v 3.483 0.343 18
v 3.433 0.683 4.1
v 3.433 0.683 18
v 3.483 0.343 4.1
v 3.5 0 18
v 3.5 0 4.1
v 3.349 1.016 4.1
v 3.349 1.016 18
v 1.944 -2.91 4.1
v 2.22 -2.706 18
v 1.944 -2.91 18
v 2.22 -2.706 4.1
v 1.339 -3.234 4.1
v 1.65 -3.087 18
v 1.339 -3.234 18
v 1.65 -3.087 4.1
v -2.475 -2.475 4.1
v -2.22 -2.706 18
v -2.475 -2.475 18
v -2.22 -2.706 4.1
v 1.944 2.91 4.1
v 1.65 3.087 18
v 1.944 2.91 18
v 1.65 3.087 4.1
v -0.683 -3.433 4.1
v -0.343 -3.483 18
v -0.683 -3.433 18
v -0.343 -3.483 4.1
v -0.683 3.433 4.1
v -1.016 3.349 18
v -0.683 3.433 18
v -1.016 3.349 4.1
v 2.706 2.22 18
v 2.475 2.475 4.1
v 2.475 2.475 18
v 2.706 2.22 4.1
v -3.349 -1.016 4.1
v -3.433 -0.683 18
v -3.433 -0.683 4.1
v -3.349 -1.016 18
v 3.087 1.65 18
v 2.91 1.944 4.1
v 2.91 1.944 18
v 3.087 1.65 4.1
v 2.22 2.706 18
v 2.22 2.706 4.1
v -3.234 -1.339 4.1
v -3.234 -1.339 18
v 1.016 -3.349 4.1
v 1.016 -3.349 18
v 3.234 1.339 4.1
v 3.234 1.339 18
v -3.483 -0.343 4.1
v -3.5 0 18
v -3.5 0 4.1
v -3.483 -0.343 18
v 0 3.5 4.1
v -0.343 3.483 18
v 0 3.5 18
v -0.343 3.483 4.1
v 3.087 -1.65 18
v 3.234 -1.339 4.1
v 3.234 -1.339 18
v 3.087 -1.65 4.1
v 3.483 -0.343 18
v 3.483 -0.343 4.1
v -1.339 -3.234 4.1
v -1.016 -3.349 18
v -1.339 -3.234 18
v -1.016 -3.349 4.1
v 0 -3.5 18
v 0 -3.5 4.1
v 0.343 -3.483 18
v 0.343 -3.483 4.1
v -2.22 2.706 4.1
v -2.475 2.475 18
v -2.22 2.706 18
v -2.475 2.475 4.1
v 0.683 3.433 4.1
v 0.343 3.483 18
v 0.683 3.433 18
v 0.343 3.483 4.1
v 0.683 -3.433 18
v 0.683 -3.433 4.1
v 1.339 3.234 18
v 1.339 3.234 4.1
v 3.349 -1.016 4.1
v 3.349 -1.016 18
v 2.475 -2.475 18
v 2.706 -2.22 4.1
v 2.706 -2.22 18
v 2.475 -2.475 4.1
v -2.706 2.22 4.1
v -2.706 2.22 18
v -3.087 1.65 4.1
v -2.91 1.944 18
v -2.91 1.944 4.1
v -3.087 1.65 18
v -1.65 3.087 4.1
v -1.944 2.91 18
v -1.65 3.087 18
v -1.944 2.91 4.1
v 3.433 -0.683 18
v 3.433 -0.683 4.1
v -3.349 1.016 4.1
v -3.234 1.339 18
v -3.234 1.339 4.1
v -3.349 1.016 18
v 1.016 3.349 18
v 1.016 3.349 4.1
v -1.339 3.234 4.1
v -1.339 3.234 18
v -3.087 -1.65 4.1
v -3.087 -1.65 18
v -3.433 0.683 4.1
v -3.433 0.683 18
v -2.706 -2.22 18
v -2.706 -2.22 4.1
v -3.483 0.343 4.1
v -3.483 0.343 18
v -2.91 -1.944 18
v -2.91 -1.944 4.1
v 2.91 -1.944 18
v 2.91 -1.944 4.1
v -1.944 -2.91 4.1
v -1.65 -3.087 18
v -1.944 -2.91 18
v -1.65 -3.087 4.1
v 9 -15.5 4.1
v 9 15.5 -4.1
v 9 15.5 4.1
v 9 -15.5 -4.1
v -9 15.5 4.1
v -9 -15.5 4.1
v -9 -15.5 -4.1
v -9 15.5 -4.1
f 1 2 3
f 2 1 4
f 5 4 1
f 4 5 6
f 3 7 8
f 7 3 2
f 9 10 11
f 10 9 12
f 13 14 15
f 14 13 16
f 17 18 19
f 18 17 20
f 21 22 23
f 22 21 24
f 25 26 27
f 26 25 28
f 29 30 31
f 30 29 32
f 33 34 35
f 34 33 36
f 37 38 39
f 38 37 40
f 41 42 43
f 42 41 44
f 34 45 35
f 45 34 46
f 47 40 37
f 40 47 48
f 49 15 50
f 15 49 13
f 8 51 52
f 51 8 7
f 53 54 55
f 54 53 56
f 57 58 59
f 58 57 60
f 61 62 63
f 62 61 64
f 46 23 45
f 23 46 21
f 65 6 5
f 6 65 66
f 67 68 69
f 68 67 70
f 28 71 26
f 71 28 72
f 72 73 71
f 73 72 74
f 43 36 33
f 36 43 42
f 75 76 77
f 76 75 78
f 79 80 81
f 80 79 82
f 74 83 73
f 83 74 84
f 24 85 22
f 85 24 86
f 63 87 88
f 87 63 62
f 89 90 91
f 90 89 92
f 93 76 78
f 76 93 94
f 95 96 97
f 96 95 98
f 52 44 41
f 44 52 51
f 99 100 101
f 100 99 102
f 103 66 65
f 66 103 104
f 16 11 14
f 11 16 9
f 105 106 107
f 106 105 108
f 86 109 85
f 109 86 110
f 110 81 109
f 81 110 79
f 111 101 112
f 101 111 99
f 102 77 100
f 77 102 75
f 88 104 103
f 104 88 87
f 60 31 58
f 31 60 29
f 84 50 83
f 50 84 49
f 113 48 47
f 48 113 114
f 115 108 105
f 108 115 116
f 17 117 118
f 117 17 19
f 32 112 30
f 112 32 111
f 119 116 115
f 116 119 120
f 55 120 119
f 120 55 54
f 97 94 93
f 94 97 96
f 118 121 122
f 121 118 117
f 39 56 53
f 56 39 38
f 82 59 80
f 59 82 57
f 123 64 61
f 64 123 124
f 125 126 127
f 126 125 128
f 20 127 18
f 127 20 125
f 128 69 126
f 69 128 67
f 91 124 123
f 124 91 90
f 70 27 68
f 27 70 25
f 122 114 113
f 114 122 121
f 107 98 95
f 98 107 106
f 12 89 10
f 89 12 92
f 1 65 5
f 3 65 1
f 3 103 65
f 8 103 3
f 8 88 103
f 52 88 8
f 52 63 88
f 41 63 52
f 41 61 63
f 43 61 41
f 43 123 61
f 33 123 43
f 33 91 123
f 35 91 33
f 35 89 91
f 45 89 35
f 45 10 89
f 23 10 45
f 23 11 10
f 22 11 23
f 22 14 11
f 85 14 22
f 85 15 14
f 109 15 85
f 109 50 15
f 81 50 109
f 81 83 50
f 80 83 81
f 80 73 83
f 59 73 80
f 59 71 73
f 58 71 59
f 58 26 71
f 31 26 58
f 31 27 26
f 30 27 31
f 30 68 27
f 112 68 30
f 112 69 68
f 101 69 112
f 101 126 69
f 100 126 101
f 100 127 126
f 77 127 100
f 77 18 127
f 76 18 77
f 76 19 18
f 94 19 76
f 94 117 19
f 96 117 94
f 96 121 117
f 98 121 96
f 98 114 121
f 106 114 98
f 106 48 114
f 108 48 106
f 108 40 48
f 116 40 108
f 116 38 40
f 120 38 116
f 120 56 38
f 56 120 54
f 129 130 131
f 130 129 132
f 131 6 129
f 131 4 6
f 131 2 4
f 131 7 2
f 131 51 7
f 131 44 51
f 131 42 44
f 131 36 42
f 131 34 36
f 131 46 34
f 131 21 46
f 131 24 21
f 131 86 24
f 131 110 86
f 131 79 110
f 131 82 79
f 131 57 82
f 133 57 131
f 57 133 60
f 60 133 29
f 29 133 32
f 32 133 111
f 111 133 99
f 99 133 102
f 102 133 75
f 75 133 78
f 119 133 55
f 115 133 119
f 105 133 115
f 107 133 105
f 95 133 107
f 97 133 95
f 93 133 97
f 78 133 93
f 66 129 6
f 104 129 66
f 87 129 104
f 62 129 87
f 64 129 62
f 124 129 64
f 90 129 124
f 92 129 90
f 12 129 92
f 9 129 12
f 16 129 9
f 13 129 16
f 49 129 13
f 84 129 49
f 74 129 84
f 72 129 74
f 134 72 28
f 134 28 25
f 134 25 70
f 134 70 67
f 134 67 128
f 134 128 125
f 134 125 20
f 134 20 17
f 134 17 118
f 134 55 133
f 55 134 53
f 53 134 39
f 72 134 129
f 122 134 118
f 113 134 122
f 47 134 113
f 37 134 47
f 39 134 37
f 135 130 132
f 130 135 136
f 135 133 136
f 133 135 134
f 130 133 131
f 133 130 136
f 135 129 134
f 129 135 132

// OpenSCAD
$fn = 64;

// interference fit adjustment for 3D printer
iFitAdjust = .4;
iFitAdjust_d = .25;

// waveshare 5" knock off
displayScreenWidth = 118;
displayScreenHeight = 70;
displayScreenThickness = 3;
displayBoardWidth = 122;
displayBoardHeight = 78.5;
displayBoardThickness = 7;
displayDepth = 22;
displayScrewDiameter = 3;
module display() {
    // screen
    %translate([-displayScreenWidth / 2, -displayScreenHeight / 2, 0])
        cube([displayScreenWidth, displayScreenHeight, displayScreenThickness], center=false);
    // board
    %translate([-displayBoardWidth / 2, -displayBoardHeight / 2, -displayBoardThickness])
        cube([displayBoardWidth, displayBoardHeight, displayBoardThickness], center=false);
    // corner tabs
    for (i = [-1,1])
        for (j = [-1,1]) {
            translate([i * displayBoardWidth/2, j * displayBoardHeight/2, -displayBoardThickness])
                difference() {
                    cube([20, 20, 3], center=true);
                    translate([i *2, j * 2, -displayBoardThickness / 2])
                        cylinder(h=displayBoardThickness + 2, r = displayScrewDiameter + iFitAdjust_d);
                }
        }
}

// encoders
encoderShaftDiameter = 7;
encoderShaftHeight = 18;
encoderWidth = 18;
encoderLength = 31;
encoderDepth = 8.2;
module encoder() {
    // encoder shaft
    cylinder(h = encoderShaftHeight, d = encoderShaftDiameter, center=false);
    // encoder base
    translate([-encoderWidth/2, -encoderLength/2, -encoderDepth/2])
        cube([encoderWidth, encoderLength, encoderDepth]);
}

// lid with screen and encoders
module lid() {
    // face plate
    // screen cutout
    // encoder cutout
    // screw holes
}

// box with pi mounts and holes
module box() {
    // bottom
    // pi mount holes
    // sides
    // pi usb / ethernet
    // hifi audio out
}

//display();
encoder();
